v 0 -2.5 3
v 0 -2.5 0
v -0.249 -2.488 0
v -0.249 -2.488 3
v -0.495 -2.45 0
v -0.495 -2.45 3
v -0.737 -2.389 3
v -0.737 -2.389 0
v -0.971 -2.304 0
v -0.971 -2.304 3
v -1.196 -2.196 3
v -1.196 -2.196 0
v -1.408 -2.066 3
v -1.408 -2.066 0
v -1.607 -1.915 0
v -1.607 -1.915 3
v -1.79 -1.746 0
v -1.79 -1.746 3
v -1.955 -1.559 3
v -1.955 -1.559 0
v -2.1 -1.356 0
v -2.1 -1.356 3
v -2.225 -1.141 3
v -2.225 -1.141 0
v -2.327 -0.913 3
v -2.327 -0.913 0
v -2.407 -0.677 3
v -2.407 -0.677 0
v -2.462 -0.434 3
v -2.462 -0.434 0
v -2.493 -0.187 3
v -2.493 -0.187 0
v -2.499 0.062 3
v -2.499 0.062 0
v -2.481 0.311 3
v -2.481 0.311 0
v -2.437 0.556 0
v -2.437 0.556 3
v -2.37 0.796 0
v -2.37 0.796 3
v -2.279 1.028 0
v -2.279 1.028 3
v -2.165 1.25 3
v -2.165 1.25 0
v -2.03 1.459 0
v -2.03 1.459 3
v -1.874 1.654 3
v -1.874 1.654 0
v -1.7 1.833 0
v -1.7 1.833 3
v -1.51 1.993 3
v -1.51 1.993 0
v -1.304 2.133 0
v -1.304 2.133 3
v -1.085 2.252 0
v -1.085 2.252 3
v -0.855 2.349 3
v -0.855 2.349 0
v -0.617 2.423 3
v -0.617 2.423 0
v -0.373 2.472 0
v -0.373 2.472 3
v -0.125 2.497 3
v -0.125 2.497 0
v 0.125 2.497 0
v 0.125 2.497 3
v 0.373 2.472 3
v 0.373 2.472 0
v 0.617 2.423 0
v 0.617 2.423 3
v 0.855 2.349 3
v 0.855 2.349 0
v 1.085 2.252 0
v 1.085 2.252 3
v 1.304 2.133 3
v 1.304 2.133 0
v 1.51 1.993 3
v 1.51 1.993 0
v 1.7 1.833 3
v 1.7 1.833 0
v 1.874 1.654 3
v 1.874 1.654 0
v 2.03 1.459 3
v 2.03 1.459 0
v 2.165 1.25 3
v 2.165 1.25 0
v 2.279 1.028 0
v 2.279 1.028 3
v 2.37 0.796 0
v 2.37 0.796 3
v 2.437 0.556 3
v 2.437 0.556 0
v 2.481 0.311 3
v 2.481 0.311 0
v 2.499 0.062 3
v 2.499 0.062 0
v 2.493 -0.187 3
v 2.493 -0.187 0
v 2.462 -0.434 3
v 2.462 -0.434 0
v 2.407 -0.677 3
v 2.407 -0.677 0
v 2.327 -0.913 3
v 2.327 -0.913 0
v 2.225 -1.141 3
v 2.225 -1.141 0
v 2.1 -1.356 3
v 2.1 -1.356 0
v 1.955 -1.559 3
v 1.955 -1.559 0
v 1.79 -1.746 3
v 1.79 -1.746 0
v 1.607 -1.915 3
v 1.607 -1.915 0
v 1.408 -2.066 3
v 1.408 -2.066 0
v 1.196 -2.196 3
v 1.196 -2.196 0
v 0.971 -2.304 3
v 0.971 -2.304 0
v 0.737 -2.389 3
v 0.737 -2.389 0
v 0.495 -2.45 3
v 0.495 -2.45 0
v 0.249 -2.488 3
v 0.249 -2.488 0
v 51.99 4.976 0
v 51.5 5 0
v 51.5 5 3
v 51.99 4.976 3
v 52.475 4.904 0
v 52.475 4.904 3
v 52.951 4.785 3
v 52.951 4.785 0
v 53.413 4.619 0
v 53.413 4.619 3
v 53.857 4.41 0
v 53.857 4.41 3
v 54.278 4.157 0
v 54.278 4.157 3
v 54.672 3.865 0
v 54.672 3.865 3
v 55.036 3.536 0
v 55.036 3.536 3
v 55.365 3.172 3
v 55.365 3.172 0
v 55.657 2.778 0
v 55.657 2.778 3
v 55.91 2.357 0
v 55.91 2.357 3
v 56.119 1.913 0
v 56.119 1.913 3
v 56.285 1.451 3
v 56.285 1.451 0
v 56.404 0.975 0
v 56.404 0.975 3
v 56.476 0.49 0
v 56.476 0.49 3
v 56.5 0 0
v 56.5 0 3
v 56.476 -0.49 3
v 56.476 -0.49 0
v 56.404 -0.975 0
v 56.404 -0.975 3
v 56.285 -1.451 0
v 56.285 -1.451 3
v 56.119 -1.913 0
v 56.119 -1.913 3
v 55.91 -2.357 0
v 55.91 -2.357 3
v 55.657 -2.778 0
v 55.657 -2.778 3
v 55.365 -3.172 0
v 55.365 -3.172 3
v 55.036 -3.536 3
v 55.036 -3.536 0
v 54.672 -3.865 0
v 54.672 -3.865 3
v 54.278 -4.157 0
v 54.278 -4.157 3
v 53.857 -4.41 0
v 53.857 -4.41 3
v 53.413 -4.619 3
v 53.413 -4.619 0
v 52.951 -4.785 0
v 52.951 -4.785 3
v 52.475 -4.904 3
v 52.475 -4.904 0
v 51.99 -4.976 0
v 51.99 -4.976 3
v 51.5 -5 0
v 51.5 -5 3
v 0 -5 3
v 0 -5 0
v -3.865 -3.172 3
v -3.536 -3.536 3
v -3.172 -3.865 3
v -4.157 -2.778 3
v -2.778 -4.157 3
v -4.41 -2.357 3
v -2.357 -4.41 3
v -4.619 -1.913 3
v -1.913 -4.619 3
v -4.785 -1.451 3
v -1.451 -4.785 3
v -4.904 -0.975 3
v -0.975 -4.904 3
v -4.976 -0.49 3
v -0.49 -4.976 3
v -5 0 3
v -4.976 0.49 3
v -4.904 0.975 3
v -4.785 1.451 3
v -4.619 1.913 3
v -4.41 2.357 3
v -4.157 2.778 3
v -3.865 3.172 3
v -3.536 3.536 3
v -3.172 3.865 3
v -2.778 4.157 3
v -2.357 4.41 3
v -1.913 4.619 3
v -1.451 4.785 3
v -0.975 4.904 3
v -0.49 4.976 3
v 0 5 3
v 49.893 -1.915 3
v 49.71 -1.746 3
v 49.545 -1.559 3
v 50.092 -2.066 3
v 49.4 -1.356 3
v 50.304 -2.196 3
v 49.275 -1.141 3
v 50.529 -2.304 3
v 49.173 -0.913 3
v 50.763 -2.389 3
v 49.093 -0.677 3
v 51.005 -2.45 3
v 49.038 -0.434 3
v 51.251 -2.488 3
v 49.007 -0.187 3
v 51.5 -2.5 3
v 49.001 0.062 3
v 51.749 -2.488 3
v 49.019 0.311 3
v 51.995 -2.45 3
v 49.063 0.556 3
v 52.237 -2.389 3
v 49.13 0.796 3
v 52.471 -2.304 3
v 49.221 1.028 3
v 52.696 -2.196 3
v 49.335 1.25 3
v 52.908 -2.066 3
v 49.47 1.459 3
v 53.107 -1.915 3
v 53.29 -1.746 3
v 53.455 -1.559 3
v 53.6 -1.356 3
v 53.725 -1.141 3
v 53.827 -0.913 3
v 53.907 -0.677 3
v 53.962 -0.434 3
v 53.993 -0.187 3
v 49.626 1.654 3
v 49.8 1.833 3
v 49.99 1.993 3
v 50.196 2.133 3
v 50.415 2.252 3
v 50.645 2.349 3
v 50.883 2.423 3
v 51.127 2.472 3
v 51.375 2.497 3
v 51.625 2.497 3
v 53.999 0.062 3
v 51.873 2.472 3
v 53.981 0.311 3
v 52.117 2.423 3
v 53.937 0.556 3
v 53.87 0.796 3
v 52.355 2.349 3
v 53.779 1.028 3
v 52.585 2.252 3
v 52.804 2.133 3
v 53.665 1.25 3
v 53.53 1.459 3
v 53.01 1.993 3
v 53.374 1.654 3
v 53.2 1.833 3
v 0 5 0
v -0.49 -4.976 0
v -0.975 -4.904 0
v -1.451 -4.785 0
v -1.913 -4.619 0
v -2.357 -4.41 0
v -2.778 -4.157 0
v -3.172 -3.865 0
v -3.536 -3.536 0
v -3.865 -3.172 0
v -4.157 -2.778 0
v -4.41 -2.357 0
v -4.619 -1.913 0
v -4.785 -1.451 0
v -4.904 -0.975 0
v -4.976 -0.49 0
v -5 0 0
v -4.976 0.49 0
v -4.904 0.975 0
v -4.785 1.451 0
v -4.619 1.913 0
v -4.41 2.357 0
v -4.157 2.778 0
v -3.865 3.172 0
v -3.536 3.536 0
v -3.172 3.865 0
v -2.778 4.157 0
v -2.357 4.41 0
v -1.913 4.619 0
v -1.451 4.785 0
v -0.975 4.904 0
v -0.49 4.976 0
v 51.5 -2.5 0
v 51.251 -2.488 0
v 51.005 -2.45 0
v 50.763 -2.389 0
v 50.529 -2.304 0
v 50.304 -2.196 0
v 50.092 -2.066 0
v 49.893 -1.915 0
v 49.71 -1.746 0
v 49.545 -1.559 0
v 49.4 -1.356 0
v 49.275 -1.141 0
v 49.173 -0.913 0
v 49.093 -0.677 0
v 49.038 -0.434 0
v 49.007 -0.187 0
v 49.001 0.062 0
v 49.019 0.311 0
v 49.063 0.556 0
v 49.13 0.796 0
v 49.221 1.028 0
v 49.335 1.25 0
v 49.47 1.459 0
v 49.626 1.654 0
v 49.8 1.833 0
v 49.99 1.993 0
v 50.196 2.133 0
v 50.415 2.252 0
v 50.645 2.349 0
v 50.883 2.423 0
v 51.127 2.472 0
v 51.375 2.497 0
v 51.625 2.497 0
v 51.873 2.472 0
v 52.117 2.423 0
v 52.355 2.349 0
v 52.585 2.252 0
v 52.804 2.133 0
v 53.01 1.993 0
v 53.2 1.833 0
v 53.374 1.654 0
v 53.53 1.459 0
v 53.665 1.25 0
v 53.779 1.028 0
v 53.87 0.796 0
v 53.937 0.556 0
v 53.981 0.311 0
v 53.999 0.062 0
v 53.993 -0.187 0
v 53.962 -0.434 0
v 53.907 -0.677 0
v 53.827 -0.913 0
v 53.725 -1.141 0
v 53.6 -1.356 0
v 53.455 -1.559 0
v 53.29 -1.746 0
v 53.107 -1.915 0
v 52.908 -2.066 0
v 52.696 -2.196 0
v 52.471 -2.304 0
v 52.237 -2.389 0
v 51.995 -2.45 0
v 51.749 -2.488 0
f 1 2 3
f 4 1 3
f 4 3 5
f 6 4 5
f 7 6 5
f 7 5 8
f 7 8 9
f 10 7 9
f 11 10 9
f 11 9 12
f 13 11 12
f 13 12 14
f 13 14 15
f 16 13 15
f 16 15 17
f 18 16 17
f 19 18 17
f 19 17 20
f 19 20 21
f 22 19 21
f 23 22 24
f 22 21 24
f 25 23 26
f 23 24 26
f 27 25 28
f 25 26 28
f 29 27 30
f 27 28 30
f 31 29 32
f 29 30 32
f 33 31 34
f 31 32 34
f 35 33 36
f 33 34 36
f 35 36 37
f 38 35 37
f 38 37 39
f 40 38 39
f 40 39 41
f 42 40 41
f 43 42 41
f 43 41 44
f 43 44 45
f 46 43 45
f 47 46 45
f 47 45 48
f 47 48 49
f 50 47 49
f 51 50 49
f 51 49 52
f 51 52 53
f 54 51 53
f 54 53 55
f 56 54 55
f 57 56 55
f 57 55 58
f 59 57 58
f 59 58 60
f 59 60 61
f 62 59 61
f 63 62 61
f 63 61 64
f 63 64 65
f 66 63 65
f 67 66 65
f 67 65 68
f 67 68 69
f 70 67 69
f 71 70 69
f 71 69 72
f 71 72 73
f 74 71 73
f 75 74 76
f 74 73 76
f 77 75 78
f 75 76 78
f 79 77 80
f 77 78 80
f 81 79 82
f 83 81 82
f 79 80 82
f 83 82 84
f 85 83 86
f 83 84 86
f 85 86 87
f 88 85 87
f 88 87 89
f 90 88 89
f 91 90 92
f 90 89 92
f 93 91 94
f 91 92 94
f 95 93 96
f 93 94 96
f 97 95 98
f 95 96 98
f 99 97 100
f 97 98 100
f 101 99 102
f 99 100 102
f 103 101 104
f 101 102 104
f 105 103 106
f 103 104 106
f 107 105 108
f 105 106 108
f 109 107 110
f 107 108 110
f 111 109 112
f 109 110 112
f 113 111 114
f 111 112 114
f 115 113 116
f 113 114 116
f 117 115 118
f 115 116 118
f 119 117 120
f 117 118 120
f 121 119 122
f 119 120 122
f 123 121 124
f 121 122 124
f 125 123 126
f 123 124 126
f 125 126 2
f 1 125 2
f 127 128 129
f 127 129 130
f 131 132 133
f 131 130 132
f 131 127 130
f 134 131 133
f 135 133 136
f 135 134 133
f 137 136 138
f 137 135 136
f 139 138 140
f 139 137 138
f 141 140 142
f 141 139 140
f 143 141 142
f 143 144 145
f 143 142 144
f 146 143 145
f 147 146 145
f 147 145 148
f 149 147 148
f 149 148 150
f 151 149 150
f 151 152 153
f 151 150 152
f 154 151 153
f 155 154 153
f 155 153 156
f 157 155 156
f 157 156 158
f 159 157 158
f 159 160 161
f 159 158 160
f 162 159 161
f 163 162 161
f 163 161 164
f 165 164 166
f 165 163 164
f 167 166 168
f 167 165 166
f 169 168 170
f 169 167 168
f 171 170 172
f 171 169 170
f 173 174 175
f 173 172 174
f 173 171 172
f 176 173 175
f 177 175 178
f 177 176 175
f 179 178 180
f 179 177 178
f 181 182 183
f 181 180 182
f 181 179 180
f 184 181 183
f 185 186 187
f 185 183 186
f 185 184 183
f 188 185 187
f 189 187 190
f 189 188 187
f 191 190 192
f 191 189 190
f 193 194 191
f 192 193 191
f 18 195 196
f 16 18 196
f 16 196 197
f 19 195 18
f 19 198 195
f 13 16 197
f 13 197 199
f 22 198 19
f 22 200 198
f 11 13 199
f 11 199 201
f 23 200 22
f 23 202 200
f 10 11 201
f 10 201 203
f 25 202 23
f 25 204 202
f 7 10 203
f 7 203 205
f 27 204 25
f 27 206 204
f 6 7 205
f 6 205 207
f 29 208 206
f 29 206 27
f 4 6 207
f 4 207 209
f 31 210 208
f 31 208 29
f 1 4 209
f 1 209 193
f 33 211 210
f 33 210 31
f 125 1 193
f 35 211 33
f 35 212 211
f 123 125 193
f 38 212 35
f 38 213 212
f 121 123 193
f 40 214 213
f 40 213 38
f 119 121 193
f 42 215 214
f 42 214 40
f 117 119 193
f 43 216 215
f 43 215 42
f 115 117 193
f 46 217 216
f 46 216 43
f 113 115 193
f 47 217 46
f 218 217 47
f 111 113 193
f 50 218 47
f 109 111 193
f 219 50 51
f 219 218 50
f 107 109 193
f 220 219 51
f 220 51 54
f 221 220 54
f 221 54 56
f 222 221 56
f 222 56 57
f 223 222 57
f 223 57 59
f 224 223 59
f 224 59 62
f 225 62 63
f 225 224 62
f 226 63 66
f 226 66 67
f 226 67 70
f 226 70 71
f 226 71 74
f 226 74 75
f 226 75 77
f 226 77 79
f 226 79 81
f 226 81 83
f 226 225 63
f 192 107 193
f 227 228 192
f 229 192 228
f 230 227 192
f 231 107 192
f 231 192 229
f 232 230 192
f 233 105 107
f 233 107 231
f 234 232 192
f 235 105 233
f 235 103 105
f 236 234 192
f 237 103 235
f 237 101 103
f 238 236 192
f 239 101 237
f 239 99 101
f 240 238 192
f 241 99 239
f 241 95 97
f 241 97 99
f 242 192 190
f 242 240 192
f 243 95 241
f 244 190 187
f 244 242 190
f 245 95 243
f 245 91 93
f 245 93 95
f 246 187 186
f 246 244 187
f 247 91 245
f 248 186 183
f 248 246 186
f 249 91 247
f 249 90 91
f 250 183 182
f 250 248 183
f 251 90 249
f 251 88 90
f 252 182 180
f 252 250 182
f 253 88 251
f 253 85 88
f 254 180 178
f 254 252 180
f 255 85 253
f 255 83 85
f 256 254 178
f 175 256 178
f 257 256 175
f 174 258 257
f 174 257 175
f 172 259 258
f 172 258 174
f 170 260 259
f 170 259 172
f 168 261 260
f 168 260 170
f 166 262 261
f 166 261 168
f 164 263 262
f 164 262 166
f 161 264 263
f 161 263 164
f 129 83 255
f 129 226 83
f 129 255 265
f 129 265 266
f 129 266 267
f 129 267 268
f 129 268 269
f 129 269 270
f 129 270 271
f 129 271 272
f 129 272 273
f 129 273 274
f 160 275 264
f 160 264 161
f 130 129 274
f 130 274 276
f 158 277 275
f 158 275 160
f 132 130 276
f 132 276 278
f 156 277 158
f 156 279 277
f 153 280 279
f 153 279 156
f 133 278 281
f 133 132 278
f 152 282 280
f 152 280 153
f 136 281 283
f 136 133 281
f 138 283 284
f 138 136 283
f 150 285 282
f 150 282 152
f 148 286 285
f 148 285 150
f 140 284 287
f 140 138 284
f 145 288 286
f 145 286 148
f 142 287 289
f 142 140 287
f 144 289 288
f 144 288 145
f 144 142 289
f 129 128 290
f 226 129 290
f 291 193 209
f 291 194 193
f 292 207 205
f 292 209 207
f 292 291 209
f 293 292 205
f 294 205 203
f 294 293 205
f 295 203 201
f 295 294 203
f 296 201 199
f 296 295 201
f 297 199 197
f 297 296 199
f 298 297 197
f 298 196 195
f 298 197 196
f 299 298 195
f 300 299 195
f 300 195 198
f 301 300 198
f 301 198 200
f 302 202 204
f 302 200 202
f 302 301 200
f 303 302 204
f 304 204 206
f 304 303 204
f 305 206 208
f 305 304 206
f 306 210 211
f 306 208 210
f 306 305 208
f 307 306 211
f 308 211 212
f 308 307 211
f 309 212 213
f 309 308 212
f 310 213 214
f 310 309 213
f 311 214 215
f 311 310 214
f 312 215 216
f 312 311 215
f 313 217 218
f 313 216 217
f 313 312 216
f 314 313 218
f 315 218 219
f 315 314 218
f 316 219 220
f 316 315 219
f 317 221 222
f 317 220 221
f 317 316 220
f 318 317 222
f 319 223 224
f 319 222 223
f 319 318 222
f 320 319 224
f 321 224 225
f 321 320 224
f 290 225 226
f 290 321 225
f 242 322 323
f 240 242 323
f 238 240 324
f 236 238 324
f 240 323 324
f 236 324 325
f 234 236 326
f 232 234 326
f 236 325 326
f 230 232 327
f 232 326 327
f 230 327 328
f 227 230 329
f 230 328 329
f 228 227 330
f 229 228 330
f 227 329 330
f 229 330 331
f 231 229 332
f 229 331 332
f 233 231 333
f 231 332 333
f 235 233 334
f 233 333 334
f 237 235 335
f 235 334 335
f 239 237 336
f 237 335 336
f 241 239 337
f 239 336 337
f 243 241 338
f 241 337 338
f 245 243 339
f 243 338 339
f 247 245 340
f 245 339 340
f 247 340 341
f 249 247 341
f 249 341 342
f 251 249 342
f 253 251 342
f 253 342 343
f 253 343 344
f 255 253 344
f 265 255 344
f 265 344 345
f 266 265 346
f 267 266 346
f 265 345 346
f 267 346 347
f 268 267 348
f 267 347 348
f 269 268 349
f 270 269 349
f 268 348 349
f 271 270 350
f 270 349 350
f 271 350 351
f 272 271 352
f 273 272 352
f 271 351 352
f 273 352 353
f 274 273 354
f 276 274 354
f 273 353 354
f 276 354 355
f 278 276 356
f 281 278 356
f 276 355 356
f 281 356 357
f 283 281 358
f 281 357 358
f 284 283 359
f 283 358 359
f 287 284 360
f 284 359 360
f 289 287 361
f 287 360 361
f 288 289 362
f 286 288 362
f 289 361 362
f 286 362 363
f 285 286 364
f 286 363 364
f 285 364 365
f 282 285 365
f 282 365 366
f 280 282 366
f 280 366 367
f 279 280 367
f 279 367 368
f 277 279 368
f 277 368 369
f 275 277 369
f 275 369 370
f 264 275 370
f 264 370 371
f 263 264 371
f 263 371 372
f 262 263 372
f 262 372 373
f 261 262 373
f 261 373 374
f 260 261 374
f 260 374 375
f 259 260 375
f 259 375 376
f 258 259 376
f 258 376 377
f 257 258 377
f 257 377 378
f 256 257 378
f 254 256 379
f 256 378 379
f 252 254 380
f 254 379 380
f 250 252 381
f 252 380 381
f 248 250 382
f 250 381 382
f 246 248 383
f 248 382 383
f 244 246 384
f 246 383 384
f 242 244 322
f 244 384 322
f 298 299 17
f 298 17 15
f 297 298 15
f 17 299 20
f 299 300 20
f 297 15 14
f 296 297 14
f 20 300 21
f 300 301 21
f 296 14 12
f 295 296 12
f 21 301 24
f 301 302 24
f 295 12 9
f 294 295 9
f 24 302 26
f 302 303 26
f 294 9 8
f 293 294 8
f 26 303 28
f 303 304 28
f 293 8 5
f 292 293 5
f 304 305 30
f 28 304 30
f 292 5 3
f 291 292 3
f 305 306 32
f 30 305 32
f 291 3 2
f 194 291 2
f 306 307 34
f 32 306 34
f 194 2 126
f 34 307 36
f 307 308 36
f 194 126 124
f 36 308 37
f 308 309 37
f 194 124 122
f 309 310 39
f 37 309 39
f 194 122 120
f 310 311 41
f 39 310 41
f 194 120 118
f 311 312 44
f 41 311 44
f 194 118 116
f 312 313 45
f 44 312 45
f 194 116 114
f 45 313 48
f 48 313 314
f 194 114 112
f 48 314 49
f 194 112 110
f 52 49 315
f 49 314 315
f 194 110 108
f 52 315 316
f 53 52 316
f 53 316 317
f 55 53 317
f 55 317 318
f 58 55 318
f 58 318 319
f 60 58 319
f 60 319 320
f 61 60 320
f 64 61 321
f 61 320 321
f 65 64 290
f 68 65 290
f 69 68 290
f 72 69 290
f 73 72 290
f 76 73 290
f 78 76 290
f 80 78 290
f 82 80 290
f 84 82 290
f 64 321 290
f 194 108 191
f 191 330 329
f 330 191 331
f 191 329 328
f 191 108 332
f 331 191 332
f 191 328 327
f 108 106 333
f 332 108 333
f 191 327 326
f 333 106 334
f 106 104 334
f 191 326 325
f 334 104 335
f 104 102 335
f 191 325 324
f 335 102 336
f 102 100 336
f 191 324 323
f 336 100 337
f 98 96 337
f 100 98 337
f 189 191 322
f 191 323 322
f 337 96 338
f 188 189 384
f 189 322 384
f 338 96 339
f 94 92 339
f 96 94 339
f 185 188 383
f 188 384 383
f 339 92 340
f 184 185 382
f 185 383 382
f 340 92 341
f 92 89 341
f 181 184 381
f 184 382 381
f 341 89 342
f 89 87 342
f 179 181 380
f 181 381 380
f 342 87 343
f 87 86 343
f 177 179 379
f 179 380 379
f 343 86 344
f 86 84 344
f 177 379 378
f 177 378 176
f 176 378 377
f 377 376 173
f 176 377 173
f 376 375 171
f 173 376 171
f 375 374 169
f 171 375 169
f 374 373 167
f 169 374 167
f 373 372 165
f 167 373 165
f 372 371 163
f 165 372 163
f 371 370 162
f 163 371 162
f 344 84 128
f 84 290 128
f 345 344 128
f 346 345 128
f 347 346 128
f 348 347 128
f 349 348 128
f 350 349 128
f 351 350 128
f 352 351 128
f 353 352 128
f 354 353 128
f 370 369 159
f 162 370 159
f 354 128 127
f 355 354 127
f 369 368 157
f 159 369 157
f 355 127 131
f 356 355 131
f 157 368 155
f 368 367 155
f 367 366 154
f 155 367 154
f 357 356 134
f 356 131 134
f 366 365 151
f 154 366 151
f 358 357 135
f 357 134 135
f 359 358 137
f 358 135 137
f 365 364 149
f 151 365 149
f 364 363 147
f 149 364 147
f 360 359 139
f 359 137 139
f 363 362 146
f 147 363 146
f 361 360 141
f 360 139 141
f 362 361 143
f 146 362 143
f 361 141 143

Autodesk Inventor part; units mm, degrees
ref_plane "YZ Plane" through (0, 0, 0) normal (1, 0, 0) x (0, 1, 0)
ref_plane "XZ Plane" through (0, 0, 0) normal (0, 1, 0) x (-1, 0, 0)
ref_plane "XY Plane" through (0, 0, 0) normal (0, 0, 1) x (1, 0, 0)
sketch "草圖1" plane through (0, 0, 0) normal (0, 0, 1) x (1, 0, 0)
  line L0 (0, 0) -> (51.5, 0) construction
  line L1 (0, -5) -> (51.5, -5)
  line L2 (51.5, 5) -> (0, 5)
  arc A0 (0, 5) -> (0, -5) centre (0, 0) ccw
  arc A1 (51.5, -5) -> (51.5, 5) centre (51.5, 0) ccw
  point P0 (25.75, 0)
  dimension "d0" = 51.5
  dimension "d1" = 5
extrude "擠出1" add sketch "草圖1" along normal blind 3
hole "孔1" at (51.5, 0, 3) direction (0, 0, -1) diameter 5 depth 8 tip angle 118
hole "孔2" at (0, 0, 3) direction (0, 0, -1) diameter 5 depth 8 tip angle 118
properties part number "02連桿25"
